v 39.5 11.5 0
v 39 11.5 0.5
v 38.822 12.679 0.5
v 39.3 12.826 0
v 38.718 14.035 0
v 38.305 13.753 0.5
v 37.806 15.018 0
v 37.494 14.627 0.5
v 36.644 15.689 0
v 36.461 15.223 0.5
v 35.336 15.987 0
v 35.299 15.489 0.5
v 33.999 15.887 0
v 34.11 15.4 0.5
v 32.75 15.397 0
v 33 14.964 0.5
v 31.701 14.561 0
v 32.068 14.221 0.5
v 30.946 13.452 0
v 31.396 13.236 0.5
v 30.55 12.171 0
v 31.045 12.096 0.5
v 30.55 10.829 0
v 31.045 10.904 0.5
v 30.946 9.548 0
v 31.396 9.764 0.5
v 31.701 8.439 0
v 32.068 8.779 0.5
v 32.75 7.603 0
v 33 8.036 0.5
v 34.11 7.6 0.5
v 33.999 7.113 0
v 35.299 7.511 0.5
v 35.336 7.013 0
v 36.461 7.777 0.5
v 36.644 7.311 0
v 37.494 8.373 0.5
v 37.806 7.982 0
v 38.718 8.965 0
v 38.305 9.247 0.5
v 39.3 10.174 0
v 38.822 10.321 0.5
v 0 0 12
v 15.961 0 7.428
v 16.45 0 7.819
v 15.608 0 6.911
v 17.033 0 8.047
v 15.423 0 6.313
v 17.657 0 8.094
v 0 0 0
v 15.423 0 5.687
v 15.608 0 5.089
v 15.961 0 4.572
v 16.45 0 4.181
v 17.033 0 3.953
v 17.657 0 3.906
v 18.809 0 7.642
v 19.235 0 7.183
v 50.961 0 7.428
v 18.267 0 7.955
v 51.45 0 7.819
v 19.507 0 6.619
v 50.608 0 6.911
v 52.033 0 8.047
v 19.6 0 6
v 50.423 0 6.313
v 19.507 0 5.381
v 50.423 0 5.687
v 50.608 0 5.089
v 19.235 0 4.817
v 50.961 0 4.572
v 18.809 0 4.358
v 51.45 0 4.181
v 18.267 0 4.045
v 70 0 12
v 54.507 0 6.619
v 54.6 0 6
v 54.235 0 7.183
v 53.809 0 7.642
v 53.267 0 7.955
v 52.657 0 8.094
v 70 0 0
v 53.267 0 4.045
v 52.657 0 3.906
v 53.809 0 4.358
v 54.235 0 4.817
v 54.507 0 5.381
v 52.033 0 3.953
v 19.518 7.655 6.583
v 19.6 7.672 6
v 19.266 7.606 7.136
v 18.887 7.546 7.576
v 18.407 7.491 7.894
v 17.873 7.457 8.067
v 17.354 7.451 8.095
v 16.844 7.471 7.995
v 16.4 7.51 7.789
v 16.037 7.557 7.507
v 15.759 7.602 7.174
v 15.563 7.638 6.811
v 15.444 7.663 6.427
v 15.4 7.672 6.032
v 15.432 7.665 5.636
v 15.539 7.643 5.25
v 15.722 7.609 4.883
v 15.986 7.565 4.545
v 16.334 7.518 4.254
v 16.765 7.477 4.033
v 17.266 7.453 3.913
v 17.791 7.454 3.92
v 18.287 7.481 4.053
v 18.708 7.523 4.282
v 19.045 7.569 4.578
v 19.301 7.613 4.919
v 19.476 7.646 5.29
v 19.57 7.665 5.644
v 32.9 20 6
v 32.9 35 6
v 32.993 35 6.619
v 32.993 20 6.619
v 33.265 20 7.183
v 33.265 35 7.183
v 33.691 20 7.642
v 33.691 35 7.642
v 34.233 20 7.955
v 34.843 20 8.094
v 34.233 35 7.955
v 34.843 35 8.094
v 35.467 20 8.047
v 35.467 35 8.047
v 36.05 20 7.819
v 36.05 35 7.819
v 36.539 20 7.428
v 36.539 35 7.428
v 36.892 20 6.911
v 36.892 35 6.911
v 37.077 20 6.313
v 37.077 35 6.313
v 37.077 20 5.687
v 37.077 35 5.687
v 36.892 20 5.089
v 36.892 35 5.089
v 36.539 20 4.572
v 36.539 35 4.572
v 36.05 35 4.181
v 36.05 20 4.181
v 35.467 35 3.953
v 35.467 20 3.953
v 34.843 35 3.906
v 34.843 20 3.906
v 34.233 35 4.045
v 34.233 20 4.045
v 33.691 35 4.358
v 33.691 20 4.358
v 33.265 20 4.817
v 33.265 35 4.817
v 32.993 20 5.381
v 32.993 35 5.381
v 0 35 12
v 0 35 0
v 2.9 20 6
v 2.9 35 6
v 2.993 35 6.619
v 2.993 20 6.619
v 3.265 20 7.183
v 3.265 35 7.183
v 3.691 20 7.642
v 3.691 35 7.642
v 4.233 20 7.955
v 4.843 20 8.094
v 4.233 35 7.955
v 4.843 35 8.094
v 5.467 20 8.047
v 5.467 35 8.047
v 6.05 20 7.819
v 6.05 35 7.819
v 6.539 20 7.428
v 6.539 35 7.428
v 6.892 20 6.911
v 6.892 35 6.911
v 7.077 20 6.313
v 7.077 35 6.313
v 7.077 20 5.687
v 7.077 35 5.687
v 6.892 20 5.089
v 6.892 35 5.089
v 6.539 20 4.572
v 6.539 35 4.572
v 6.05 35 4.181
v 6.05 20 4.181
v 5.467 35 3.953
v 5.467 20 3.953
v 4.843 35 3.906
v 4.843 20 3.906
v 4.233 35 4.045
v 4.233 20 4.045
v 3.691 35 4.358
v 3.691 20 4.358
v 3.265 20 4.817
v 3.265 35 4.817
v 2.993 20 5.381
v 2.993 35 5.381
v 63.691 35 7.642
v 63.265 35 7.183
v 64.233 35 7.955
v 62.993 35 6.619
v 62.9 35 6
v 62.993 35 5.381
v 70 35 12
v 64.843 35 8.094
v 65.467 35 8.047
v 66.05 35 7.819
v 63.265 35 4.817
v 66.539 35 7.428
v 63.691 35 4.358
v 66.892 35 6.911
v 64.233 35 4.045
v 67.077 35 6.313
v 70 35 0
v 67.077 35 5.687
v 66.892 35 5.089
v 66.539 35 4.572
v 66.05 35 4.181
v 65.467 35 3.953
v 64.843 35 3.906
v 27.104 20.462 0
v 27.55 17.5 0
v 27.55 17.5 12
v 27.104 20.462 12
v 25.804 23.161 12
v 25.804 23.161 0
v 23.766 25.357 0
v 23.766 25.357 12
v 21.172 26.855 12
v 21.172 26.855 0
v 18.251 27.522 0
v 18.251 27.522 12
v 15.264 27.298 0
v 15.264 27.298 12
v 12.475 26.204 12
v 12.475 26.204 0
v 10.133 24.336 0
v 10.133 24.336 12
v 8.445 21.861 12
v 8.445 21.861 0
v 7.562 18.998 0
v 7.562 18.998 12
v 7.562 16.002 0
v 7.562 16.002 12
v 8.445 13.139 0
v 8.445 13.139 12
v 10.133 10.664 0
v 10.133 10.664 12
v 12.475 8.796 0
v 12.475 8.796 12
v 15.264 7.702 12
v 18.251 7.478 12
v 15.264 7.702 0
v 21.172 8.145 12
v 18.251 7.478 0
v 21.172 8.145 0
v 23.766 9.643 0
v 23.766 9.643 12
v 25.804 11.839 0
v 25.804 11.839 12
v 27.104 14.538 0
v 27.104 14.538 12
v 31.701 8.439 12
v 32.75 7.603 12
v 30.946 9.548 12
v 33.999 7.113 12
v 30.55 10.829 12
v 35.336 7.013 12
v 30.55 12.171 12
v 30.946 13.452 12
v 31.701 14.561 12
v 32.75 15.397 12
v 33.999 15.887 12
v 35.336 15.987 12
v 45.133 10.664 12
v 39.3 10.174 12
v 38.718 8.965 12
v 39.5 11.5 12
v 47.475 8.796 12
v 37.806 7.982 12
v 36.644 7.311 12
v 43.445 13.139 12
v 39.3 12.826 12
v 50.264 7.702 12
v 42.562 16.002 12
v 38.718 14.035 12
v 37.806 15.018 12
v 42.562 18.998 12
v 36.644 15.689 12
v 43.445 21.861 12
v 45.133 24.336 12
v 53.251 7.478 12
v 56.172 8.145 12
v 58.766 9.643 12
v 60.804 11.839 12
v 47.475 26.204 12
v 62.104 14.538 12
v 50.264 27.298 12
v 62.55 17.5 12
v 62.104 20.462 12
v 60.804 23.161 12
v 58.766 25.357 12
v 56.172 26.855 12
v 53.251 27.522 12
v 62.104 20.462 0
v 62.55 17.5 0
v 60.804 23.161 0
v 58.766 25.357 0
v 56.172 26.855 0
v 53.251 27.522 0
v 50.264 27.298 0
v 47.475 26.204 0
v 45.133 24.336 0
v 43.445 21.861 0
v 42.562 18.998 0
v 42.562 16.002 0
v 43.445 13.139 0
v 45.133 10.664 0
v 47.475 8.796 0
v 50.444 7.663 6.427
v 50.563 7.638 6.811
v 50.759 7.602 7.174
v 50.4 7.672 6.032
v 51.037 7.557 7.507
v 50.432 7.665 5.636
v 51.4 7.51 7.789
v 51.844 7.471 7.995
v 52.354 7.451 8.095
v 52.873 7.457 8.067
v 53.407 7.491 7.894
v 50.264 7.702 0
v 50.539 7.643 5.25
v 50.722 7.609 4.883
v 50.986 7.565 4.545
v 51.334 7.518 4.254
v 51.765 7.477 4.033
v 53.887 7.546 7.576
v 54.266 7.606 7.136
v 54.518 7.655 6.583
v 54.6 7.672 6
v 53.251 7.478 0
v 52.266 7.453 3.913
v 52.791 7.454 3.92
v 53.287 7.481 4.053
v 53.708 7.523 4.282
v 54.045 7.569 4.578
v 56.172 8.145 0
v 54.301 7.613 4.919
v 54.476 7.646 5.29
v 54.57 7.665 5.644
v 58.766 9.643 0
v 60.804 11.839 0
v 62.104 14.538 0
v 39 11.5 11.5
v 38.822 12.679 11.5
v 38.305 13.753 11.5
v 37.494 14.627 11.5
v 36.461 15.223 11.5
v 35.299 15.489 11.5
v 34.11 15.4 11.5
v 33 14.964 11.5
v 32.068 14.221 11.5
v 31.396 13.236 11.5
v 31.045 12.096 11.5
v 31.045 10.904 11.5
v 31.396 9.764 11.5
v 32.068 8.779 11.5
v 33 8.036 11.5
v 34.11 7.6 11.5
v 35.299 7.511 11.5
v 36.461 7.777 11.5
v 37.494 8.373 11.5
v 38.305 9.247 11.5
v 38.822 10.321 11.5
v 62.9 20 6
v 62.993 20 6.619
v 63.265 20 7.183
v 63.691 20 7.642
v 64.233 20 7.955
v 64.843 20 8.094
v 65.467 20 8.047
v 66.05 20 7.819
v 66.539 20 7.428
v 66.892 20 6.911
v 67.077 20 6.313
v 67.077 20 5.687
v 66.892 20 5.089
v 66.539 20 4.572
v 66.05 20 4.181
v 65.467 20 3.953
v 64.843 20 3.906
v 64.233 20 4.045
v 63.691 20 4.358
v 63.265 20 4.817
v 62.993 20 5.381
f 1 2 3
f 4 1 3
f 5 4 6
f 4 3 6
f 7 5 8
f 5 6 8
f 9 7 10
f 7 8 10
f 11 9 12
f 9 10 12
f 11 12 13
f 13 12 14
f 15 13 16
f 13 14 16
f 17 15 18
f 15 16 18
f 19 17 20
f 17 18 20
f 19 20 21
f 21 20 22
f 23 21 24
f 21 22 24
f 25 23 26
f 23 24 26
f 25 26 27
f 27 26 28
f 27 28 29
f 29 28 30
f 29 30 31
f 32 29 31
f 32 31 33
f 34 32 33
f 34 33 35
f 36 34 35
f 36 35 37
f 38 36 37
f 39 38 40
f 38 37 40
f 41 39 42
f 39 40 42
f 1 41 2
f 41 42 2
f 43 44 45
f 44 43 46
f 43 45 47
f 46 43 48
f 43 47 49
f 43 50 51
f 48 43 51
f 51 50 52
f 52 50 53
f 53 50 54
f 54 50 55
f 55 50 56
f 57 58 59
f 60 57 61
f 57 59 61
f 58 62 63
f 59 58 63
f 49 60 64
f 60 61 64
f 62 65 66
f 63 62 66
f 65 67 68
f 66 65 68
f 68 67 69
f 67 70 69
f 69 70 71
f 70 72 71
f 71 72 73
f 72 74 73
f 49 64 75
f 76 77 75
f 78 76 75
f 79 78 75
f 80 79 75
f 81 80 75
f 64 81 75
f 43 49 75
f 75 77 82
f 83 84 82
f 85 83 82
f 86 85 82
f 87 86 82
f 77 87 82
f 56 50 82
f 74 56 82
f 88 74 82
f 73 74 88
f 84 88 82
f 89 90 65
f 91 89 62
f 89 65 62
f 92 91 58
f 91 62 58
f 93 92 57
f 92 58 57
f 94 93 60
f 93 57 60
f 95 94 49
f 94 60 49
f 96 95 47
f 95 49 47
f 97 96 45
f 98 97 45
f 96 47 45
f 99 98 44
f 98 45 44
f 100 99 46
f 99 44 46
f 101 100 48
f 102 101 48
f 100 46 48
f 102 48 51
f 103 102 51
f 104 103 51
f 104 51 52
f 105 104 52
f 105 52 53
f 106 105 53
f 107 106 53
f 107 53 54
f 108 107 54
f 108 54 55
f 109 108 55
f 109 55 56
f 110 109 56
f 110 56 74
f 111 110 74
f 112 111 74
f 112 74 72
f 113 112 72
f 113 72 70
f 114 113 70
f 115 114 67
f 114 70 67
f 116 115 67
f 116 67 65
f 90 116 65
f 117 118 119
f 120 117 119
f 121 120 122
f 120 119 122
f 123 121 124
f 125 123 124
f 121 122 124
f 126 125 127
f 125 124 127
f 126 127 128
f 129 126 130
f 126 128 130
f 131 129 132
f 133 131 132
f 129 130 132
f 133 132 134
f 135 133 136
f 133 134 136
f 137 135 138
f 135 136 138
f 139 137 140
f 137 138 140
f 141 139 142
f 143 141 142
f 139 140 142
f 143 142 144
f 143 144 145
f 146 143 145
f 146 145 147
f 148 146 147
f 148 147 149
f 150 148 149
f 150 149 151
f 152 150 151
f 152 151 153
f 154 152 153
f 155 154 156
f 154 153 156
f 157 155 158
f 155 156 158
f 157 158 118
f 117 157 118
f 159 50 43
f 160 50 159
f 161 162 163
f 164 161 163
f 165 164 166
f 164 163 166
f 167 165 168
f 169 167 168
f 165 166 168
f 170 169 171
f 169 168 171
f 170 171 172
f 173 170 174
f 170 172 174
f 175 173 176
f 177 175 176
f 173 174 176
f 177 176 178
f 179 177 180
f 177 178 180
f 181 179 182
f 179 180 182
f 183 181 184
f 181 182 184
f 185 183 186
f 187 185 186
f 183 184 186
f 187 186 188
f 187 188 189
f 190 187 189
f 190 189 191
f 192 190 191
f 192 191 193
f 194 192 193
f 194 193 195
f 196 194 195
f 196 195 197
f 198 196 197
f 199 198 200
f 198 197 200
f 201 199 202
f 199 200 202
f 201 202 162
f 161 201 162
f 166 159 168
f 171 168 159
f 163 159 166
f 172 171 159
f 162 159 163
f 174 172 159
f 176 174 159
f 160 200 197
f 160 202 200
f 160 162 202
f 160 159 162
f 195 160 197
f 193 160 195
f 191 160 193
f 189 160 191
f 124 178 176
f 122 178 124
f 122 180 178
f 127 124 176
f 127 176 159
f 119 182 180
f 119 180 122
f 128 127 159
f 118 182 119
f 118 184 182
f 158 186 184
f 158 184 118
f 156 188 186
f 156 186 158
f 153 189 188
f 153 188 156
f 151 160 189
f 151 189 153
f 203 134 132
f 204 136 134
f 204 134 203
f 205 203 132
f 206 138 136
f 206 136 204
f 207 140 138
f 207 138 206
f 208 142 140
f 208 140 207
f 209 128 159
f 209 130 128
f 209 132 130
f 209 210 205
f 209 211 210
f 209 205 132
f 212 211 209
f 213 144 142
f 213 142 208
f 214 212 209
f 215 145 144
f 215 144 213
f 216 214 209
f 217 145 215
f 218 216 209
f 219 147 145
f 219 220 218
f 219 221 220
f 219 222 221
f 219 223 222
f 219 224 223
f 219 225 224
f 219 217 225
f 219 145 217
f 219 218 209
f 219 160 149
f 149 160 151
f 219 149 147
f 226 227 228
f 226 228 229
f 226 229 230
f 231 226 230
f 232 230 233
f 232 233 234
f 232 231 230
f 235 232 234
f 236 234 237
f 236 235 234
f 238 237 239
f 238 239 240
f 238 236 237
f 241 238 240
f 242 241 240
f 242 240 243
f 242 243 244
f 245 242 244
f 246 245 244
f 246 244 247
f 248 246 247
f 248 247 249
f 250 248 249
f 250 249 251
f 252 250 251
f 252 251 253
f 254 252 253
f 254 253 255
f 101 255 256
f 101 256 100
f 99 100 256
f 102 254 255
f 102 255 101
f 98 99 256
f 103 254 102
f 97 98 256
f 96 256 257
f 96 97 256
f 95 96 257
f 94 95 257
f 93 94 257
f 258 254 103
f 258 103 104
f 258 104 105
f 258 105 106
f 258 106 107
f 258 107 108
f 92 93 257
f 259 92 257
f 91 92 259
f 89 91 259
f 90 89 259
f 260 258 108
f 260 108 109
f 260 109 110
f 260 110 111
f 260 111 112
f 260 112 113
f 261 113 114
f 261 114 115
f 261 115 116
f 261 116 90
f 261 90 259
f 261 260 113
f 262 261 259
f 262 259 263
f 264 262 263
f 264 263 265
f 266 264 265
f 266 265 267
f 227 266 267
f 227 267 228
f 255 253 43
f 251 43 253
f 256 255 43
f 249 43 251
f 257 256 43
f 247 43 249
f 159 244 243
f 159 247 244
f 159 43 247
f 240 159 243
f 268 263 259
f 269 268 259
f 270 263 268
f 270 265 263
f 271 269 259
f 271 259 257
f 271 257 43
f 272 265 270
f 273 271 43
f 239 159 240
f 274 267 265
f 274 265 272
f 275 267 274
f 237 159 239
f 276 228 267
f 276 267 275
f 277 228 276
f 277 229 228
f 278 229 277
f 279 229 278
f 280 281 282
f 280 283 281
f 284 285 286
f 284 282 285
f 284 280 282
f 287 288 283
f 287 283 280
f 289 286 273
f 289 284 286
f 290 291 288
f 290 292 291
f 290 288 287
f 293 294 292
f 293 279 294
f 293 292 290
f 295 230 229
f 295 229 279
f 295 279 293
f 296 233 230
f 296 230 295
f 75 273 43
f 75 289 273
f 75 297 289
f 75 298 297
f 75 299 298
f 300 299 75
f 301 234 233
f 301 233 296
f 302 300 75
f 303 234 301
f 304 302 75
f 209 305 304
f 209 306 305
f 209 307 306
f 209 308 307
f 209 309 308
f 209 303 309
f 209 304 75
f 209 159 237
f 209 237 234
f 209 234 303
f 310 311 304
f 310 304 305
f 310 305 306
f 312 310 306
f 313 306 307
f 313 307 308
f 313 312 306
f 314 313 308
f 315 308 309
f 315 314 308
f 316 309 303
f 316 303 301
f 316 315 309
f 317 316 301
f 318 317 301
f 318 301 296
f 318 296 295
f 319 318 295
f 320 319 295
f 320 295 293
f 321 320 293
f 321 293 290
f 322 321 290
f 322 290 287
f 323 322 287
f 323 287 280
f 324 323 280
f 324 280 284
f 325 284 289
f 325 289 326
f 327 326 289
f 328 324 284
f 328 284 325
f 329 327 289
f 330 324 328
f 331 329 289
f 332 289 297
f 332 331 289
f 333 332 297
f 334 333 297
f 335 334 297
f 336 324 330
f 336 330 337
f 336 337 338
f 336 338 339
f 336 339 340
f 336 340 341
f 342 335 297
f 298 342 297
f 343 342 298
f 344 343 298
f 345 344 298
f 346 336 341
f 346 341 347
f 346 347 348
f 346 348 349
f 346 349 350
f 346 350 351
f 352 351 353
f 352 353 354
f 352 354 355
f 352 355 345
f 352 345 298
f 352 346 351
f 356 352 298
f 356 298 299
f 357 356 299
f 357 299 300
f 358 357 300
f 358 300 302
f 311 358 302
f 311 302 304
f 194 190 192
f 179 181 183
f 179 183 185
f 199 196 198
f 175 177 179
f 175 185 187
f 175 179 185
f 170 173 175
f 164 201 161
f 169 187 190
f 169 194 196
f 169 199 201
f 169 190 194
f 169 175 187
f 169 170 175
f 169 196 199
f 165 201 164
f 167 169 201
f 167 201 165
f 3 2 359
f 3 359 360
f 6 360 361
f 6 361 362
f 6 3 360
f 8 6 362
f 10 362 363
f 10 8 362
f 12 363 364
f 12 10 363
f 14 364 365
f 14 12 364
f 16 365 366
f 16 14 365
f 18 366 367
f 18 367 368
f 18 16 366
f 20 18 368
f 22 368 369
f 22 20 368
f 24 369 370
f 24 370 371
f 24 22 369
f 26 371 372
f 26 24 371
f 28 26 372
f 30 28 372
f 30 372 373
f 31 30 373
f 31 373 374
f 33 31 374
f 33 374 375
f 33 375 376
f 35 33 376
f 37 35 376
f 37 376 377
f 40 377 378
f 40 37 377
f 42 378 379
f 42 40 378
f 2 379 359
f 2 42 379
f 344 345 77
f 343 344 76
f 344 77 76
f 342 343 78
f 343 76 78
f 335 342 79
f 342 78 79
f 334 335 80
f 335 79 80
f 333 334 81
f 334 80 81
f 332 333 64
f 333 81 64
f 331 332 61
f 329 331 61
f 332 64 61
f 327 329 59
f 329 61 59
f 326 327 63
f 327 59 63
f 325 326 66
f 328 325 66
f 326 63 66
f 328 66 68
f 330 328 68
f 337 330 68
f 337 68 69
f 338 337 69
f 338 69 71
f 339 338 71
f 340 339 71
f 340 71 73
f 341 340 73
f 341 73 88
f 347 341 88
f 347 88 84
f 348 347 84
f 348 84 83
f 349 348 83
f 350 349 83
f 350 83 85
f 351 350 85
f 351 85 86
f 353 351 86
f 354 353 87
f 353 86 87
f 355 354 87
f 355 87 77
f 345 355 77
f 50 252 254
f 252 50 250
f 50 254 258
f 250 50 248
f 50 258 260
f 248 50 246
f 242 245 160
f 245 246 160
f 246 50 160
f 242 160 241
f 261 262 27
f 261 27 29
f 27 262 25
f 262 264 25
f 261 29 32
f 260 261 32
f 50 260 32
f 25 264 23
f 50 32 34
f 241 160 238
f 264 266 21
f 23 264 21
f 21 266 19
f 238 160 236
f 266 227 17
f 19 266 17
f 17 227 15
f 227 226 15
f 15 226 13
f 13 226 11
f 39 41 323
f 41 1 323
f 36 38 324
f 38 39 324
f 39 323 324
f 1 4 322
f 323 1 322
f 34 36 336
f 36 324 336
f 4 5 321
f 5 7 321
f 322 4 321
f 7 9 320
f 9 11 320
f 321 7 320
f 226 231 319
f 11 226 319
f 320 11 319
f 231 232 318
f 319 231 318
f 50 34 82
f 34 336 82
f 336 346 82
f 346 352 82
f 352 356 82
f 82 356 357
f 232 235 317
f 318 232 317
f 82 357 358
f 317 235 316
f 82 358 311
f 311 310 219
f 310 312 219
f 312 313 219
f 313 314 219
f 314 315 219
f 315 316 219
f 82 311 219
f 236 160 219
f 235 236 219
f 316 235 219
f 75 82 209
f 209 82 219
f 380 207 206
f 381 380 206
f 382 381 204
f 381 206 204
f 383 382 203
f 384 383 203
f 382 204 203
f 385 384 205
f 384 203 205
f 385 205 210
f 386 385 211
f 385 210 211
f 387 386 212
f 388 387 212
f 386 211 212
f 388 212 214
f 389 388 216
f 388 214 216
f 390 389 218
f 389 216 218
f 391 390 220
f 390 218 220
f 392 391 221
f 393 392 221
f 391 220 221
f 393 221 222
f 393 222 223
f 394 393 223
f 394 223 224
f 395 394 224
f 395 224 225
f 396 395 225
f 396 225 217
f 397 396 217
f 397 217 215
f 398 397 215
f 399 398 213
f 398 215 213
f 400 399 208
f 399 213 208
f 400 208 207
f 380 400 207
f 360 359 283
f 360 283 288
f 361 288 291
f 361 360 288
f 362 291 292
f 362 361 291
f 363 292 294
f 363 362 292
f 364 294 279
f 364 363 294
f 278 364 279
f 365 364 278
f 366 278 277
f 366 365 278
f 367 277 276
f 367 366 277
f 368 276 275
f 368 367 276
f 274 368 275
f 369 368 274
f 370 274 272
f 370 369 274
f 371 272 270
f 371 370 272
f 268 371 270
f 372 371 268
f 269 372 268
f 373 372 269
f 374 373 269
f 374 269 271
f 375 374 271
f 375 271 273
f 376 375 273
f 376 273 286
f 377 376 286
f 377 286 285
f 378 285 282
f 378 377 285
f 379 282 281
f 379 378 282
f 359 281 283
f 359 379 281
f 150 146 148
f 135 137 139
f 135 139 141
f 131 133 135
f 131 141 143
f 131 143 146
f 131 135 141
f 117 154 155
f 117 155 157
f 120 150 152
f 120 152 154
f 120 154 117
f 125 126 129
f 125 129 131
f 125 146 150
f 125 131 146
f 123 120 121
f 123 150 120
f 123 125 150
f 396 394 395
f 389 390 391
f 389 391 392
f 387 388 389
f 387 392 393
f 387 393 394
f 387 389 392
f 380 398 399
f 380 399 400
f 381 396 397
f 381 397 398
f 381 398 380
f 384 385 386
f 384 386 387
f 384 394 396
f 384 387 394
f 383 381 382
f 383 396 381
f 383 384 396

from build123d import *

# Parameters (mm, degrees)
F0_W     = 70
F0_H     = 35
F0_R     = 4
F0_R_2   = 10.05
F1_DEPTH = 12
F2_R     = 2.1
F3_DEPTH = 15
F4_R     = 2.1
F5_DEPTH = 7.6728517519
F6_SIZE  = 0.5


with BuildPart() as f1:
    # F0 (on Top) → F1 (new body)
    with BuildSketch(Plane.XY):
        with Locations((35, 17.5)):
            Rectangle(F0_W, F0_H)
        with Locations((35, 11.5)):
            Circle(F0_R, mode=Mode.SUBTRACT)
        with Locations((17.5, 17.5)):
            Circle(F0_R_2, mode=Mode.SUBTRACT)
        with Locations((52.5, 17.5)):
            Circle(F0_R_2, mode=Mode.SUBTRACT)
    extrude(amount=F1_DEPTH)

    # F2 (on face) → F3 (cut)
    with BuildSketch(Plane(origin=(0, 35, 0), x_dir=(-1, 0, 0), z_dir=(0, 1, 0))):
        with Locations((-35, 6)):
            Circle(F2_R)
        with Locations((-65, 6)):
            Circle(F2_R)
        with Locations((-5, 6)):
            Circle(F2_R)
    extrude(amount=-F3_DEPTH, mode=Mode.SUBTRACT)

    # F4 (on face) → F5 (cut, through all)
    with BuildSketch(Plane.XZ):
        with Locations((17.5, 6)):
            Circle(F4_R)
        with Locations((52.5, 6)):
            Circle(F4_R)
    extrude(amount=-F5_DEPTH, mode=Mode.SUBTRACT)

    # F6
    f6_edges = [f1.edges().sort_by_distance(p)[0] for p in [
        (31, 11.5, 12),
        (31, 11.5, 0),
    ]]
    chamfer(f6_edges, length=F6_SIZE)


solid = f1.part
